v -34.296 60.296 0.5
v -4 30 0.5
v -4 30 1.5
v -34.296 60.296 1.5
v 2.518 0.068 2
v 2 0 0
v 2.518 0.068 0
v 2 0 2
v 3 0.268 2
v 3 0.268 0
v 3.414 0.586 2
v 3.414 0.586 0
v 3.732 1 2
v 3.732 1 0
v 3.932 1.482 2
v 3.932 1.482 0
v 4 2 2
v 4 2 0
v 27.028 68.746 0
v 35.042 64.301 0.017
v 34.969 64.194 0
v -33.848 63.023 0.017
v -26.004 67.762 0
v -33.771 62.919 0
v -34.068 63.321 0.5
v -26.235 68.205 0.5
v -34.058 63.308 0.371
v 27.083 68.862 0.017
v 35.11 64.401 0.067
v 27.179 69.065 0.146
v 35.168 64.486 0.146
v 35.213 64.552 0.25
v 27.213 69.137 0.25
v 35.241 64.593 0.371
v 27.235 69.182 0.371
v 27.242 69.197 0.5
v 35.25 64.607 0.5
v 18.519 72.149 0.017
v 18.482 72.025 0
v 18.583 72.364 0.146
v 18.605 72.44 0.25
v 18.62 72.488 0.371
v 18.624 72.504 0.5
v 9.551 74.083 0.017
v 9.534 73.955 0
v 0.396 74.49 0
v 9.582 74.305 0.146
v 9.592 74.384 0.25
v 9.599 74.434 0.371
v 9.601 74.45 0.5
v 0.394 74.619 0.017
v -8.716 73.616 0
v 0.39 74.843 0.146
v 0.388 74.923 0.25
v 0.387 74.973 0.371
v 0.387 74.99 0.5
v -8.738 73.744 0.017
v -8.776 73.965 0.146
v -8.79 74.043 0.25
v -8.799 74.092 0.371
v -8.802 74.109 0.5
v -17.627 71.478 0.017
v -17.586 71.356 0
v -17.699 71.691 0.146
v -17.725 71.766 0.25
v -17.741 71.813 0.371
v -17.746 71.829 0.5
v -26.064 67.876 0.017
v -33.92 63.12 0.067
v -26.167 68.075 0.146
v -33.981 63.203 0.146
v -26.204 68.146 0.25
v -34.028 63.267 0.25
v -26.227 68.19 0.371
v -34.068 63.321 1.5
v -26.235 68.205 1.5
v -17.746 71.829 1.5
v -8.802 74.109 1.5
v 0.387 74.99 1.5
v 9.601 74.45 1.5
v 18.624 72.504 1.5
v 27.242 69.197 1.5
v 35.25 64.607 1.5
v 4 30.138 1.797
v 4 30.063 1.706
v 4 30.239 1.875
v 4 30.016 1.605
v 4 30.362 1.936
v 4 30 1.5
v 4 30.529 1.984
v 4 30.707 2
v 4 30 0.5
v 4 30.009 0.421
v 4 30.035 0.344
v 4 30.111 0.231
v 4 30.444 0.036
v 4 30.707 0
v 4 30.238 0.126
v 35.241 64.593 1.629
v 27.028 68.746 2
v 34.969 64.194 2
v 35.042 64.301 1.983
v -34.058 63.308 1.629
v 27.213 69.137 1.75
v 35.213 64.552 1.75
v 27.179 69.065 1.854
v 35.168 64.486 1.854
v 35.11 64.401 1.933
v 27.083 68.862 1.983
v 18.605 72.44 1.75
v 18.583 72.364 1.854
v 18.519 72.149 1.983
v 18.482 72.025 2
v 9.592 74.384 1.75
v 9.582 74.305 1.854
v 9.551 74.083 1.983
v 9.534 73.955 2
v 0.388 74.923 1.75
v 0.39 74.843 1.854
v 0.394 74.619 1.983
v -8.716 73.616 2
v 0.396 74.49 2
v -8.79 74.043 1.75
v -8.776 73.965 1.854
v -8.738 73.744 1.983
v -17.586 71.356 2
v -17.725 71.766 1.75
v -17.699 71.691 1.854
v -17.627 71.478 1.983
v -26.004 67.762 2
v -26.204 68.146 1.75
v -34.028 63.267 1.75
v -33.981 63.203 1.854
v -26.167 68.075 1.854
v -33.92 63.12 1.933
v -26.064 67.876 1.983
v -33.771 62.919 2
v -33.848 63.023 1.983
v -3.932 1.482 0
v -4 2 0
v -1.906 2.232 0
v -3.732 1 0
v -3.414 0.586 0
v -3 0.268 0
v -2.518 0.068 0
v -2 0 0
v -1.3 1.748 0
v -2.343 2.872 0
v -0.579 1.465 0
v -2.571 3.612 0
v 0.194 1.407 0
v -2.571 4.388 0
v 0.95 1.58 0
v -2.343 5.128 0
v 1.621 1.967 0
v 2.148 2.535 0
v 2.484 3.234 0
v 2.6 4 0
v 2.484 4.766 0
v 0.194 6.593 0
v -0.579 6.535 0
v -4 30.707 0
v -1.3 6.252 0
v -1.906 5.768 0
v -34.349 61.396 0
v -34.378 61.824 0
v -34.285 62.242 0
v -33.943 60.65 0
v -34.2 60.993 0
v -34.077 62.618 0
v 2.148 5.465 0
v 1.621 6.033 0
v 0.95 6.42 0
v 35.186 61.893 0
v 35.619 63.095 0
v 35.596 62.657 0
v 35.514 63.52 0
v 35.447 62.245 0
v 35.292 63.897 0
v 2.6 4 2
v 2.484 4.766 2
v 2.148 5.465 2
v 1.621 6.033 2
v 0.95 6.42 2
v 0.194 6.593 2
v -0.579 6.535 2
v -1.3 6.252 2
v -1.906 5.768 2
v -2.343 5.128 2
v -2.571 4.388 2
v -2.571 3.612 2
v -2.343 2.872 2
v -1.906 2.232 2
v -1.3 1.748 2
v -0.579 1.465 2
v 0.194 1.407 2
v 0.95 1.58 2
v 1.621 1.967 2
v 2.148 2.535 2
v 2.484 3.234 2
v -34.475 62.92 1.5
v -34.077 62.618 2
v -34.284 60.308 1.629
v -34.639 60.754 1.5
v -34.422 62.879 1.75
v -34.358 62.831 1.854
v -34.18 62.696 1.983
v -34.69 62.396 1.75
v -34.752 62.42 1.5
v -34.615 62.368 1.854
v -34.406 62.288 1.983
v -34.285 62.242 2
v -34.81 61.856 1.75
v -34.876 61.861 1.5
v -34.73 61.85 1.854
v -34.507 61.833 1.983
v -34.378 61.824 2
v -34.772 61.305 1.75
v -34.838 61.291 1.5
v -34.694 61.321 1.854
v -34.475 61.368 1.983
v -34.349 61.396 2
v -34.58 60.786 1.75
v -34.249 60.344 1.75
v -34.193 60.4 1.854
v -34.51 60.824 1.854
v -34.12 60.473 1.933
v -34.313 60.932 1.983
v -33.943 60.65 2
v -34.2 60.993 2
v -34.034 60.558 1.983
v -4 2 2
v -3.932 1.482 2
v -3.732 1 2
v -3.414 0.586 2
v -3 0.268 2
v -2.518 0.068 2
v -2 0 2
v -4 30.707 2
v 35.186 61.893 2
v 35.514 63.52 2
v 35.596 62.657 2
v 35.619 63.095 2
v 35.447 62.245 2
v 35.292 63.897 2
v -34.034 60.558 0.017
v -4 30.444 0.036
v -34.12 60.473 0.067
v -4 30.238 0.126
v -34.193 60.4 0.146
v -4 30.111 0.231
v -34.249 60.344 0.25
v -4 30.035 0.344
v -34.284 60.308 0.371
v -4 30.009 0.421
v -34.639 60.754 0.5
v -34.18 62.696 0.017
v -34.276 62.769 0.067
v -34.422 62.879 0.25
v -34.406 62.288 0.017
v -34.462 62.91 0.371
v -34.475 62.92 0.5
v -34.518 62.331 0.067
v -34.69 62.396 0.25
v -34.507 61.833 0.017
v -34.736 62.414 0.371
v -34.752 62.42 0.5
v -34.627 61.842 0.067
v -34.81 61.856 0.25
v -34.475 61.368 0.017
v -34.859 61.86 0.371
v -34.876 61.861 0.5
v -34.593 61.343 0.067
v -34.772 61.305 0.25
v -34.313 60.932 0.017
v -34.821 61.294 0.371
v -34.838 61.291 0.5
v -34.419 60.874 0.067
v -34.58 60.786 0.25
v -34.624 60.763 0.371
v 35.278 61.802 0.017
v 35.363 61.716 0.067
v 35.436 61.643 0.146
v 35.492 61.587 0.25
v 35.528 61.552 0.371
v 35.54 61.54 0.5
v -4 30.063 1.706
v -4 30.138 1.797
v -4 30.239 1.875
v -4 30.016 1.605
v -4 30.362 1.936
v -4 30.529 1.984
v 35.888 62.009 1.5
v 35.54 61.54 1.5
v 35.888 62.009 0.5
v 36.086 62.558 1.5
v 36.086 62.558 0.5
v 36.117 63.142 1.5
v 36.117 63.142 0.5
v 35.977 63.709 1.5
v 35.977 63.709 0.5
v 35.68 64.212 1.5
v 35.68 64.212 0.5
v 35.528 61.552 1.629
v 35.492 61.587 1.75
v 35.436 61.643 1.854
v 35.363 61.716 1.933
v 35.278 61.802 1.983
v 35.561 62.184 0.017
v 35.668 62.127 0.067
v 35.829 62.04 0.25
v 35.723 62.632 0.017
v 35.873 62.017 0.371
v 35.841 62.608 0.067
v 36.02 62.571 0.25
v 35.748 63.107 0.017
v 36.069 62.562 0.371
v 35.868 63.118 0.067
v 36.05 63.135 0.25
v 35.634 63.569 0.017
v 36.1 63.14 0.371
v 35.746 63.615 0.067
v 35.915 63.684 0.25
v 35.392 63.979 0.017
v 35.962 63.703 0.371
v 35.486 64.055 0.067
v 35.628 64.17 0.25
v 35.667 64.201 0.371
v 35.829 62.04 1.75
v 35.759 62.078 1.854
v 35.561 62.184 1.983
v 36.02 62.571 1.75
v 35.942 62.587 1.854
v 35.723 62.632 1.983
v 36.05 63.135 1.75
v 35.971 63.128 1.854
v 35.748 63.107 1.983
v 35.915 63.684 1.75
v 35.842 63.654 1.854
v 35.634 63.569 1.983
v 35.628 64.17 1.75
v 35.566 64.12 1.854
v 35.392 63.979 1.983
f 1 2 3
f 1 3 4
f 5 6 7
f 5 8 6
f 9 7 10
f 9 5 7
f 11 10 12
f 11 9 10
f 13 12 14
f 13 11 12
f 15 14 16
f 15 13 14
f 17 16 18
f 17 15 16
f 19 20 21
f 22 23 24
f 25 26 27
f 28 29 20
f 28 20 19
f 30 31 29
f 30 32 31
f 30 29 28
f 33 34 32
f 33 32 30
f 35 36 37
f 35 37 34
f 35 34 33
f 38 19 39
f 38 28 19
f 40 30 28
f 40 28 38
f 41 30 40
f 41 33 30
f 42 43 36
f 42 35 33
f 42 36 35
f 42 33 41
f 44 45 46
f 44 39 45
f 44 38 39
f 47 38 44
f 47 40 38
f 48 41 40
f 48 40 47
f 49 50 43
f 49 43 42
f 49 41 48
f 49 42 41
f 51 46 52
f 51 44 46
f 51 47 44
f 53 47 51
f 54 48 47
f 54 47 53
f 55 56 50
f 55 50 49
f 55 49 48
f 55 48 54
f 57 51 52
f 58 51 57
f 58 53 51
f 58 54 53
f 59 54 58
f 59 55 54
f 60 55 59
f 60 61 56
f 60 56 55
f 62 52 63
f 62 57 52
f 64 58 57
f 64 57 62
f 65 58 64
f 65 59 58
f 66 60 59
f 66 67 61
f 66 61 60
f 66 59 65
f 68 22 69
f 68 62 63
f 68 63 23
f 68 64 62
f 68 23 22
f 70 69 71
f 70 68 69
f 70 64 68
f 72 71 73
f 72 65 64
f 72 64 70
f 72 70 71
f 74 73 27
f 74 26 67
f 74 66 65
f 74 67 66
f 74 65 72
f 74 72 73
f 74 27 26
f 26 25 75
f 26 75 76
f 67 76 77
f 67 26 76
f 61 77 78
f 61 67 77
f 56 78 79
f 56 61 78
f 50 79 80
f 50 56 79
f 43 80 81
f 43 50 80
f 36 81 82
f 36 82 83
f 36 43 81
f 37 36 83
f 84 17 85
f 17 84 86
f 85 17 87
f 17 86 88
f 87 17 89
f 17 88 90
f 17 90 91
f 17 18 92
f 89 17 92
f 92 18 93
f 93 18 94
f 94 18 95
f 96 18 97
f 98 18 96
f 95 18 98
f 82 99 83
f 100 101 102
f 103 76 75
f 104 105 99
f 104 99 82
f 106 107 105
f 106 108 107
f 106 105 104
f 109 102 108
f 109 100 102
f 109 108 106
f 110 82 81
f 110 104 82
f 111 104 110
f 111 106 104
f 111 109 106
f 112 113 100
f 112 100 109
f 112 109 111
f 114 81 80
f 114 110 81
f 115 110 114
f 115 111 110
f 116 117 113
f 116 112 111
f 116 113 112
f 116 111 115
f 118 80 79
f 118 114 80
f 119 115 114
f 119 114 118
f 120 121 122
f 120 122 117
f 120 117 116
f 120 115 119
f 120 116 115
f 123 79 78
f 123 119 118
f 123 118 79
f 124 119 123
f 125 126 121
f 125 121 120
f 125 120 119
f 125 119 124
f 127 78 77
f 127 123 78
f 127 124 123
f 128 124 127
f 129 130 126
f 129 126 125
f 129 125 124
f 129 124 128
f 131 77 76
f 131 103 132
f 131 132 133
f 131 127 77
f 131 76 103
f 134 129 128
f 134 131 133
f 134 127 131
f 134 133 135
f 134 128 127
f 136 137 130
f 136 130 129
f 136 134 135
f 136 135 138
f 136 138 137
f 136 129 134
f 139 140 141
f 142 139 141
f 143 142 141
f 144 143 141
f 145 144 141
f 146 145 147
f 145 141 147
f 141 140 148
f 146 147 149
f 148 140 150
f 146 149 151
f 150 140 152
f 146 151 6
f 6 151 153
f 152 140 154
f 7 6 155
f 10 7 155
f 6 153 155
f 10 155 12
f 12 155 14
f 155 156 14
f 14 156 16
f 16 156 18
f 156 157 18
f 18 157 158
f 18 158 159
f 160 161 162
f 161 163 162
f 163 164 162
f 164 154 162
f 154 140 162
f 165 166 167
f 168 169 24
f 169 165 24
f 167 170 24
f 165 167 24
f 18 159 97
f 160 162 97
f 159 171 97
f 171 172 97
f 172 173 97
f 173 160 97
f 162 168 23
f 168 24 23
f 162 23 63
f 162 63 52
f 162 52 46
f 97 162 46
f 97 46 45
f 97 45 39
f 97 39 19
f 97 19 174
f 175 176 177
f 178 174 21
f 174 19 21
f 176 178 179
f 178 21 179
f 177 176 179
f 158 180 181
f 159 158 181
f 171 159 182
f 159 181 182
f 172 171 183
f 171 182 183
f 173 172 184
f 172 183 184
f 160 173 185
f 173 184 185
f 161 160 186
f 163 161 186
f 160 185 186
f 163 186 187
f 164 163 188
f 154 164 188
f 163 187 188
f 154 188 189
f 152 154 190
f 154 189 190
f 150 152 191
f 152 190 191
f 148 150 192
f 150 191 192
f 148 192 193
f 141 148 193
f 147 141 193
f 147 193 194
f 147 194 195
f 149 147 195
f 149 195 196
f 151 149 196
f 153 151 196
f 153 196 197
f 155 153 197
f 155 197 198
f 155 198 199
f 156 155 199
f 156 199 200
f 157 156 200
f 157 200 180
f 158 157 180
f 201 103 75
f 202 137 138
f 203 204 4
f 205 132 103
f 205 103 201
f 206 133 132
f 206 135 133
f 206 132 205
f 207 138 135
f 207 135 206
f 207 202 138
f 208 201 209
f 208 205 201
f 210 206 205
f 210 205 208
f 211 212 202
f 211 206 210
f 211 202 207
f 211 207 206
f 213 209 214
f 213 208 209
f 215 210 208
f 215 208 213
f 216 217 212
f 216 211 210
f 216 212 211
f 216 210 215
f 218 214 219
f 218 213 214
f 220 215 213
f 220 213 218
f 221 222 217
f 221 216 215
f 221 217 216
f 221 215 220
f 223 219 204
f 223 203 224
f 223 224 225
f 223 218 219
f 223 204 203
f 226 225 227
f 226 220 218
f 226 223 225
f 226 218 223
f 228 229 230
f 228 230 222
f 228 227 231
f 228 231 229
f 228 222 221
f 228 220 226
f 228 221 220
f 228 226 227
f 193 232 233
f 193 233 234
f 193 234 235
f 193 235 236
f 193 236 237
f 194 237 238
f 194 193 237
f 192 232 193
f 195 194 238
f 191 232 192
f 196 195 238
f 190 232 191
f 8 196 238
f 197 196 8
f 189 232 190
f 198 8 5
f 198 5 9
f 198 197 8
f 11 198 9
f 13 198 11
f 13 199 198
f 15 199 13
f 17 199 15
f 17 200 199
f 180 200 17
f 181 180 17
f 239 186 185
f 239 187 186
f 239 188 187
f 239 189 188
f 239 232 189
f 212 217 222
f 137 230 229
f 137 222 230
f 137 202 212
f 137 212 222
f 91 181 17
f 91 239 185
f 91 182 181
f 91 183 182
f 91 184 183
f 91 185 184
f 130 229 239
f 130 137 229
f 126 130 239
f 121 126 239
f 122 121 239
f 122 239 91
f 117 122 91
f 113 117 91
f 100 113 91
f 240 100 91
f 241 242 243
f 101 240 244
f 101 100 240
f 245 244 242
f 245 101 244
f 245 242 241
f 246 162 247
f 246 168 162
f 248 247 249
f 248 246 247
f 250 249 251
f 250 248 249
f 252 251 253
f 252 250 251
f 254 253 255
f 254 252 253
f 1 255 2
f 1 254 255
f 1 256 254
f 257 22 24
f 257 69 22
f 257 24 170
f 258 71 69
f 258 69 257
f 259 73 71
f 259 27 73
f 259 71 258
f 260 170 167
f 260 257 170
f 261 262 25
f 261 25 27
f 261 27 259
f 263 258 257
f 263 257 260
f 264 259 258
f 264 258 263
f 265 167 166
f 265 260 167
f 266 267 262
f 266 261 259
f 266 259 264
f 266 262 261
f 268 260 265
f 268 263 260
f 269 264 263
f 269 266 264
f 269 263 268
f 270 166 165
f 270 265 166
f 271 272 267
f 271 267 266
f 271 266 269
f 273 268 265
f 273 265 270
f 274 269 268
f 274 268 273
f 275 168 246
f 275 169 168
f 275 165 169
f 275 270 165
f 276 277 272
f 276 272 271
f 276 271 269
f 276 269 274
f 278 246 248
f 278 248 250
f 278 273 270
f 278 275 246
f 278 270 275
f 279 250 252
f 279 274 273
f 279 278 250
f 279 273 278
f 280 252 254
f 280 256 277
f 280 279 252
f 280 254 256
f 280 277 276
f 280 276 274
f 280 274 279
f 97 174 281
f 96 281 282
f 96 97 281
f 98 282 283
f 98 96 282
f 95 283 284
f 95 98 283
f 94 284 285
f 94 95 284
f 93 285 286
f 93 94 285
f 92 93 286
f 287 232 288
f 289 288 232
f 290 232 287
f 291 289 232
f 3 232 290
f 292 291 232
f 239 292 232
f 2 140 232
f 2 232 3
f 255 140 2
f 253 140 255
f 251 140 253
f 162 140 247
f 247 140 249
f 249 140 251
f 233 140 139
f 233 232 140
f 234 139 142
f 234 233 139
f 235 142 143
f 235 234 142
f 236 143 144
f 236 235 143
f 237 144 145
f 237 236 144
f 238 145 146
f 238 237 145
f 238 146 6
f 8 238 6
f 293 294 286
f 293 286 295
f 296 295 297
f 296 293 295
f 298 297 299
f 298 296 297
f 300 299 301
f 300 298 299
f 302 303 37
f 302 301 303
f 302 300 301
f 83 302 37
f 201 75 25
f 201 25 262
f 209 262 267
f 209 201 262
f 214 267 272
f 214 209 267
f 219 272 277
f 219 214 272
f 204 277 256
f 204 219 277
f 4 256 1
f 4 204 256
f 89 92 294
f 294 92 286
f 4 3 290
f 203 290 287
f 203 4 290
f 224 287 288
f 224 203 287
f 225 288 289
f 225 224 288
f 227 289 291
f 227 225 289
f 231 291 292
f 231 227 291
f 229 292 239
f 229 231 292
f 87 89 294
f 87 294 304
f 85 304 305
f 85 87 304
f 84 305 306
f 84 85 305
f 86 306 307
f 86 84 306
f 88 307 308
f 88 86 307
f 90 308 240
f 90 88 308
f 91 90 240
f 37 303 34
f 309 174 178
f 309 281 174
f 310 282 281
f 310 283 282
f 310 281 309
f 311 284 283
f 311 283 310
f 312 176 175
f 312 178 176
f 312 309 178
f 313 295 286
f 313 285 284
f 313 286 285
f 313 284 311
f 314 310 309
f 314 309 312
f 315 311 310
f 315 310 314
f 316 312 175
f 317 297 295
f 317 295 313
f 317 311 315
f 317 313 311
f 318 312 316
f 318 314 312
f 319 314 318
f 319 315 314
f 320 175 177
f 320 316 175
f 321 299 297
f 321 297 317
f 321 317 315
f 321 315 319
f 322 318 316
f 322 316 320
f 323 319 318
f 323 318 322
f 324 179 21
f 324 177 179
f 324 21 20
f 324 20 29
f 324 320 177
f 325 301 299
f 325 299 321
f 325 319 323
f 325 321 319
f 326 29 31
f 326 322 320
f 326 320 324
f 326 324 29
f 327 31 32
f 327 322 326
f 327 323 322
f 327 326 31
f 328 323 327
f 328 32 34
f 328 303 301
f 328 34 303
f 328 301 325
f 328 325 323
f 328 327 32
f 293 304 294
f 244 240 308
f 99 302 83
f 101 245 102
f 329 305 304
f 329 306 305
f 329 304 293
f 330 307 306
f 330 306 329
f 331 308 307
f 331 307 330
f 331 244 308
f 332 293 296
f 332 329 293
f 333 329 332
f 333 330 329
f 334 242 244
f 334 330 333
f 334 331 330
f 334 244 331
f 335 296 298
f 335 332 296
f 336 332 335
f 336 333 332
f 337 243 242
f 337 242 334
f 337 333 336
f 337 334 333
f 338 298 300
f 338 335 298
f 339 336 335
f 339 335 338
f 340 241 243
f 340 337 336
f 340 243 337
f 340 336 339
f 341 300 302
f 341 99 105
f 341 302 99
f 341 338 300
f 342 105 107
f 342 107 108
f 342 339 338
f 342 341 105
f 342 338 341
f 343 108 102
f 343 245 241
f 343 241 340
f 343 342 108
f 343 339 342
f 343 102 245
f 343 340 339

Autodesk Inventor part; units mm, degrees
ref_plane "YZ Plane" through (0, 0, 0) normal (1, 0, 0) x (0, 1, 0)
ref_plane "XZ Plane" through (0, 0, 0) normal (0, 1, 0) x (-1, 0, 0)
ref_plane "XY Plane" through (0, 0, 0) normal (0, 0, 1) x (1, 0, 0)
sketch "Sketch1" plane through (0, 0, 0) normal (0, 0, 1) x (1, 0, 0)
  line L0 (-4, 0) -> (4, 0)
  line L1 (-4, 0) -> (-4, 30)
  line L2 (4, 0) -> (4, 30)
  arc A0 (37.2135, 63.2135) -> (-35.9097, 61.9097) centre (1.5, 15) ccw
  line L3 (4, 30) -> (37.2135, 63.2135)
  line L4 (4, 30) -> (59.6428, 30) construction
  line L5 (-4, 30) -> (-35.9097, 61.9097)
  point P0 (0, 0)
  dimension "d0" = 8
  dimension "d1" = 30
  dimension "d2" = 120
  dimension "d3" = 30
  dimension "d4" = 45
  dimension "d6" = 135
extrude "Extrusion1" add sketch "Sketch1" along normal blind 2
sketch "Sketch2" plane through (0, 0, 2) normal (0, 0, 1) x (1, 0, 0)
  circle A0 centre (0, 4) radius 2.6
  line L0 (-4, 0) -> (4, 0) projected
  dimension "d23" = 5.2
  dimension "d24" = 4
fillet "Fillet3" radius 2 2 edges at (37.2135, 63.2135, 1) (-35.9097, 61.9097, 1)
fillet "Fillet4" radius 2 2 edges at (4, 0, 1) (-4, 0, 1)
fillet "Fillet5" radius 0.5 10 edges at (-34.8764, 61.8612, 2) (-19.1482, 45.1482, 2) (36.1167, 63.1416, 2) (19.7698, 45.7698, 2) (0.3868, 74.9897, 2) (-34.8764, 61.8612, 0) (-19.1482, 45.1482, 0) (36.1167, 63.1416, 0) (19.7698, 45.7698, 0) (0.3868, 74.9897, 0)
extrude "Extrusion5" cut sketch "Sketch2" against normal blind 2
equation "\"d3\" = d1"
properties part number "Part1#2"
